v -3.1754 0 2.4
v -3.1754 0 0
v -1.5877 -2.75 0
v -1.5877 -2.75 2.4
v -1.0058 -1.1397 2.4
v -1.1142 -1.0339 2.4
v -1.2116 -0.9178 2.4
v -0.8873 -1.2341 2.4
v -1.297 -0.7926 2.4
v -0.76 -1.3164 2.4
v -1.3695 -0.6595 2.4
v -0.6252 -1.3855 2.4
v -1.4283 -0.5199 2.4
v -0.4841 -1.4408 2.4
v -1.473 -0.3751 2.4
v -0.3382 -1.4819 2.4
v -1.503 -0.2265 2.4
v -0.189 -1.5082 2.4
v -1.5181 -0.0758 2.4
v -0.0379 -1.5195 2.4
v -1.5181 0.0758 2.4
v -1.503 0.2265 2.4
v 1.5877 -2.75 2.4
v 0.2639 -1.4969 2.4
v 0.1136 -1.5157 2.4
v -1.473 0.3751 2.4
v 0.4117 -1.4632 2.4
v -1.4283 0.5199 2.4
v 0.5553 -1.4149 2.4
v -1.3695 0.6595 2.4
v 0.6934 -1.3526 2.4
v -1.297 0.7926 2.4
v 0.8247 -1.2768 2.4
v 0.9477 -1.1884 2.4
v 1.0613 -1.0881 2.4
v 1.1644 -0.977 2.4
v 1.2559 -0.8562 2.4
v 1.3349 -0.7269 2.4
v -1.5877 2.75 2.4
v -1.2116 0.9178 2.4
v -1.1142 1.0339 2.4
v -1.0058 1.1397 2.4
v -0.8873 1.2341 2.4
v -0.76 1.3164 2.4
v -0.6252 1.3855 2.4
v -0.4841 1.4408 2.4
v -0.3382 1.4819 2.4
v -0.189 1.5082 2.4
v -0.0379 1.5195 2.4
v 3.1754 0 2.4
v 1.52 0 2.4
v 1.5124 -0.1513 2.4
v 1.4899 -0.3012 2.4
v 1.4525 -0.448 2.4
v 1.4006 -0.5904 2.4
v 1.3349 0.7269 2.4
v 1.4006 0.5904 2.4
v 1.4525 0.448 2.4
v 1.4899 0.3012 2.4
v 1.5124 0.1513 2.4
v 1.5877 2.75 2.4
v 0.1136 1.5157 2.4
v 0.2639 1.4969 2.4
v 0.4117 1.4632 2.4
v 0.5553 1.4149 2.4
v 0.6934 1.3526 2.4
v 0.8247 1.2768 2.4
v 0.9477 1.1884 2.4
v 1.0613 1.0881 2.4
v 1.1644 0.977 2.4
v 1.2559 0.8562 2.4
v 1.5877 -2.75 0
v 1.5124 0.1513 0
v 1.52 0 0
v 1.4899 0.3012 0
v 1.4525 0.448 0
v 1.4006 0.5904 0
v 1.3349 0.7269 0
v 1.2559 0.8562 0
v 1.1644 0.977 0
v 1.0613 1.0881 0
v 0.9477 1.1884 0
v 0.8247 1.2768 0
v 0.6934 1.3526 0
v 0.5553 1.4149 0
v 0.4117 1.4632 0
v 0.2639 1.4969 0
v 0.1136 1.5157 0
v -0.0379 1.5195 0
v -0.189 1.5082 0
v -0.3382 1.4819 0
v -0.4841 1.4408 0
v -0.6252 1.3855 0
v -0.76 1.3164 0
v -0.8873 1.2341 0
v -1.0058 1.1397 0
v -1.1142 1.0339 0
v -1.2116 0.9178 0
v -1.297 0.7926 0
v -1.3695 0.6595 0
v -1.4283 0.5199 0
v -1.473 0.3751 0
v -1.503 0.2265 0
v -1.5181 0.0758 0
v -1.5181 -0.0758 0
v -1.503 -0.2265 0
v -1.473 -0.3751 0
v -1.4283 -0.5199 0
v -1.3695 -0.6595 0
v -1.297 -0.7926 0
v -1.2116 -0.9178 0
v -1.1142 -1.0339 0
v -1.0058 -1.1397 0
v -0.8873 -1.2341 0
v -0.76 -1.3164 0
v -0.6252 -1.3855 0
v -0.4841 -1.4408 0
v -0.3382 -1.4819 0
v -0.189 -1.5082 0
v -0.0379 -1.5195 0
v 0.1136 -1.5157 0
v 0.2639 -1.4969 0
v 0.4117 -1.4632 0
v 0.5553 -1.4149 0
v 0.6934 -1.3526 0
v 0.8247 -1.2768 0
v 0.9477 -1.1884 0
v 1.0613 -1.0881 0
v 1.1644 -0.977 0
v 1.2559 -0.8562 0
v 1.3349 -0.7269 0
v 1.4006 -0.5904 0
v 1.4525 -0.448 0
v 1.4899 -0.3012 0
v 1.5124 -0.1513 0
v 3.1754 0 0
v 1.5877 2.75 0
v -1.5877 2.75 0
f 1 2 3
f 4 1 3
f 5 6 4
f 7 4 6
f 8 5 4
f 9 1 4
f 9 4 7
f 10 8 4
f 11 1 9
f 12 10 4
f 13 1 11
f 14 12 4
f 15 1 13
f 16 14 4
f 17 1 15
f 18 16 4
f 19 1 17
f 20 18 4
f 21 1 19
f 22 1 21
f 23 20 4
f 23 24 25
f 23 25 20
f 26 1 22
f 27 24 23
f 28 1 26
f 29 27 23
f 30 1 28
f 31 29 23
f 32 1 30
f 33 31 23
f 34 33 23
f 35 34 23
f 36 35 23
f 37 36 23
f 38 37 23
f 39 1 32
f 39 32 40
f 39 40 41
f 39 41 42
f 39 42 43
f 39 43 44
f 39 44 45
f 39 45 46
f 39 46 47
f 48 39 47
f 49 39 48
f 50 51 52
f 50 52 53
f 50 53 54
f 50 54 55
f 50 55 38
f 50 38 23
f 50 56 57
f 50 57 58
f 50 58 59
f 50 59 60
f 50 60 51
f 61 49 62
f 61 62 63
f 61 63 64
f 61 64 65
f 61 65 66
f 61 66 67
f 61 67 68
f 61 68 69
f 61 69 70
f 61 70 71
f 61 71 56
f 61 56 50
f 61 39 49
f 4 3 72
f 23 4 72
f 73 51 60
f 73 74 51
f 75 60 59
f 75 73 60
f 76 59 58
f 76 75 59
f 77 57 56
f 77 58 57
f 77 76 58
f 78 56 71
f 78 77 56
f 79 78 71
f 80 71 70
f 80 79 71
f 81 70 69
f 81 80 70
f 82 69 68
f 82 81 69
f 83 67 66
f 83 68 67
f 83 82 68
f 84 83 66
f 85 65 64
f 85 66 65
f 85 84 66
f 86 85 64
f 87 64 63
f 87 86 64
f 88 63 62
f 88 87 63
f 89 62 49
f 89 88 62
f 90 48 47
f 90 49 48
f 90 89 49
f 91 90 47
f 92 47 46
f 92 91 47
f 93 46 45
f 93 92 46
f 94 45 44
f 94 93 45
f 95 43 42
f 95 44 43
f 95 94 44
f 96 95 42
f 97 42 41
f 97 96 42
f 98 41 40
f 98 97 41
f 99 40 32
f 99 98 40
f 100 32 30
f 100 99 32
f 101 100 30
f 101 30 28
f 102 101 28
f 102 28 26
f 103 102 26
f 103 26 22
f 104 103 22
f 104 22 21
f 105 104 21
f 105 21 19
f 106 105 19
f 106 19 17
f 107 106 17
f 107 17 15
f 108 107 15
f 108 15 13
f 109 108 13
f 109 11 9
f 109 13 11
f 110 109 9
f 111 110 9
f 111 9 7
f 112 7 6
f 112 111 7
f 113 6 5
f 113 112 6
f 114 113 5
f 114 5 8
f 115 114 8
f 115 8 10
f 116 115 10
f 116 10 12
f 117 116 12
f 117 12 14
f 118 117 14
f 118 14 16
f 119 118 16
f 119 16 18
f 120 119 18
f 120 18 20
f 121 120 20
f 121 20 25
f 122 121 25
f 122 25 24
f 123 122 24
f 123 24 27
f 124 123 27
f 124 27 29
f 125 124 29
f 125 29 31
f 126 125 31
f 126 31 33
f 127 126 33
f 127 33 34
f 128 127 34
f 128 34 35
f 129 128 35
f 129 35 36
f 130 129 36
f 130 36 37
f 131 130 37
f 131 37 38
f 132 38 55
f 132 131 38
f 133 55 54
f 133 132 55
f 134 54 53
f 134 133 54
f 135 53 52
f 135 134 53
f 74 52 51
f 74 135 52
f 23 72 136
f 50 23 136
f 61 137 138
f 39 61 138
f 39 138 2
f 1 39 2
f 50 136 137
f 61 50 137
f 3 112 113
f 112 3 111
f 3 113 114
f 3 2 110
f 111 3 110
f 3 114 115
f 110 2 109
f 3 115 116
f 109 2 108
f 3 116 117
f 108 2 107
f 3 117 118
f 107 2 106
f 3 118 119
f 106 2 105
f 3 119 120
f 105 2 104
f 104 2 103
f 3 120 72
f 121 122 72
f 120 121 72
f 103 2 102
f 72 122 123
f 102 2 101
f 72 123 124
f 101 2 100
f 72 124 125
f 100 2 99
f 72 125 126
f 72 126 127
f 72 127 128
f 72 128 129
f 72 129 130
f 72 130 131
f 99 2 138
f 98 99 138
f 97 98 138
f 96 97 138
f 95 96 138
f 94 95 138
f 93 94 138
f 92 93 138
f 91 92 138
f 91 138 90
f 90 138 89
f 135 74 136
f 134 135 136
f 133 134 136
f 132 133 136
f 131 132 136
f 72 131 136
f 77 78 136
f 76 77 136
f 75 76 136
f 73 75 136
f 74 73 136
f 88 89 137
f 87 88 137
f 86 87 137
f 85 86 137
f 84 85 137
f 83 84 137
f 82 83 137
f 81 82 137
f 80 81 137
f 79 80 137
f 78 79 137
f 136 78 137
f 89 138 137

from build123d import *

# Parameters (mm, degrees)
HEX_BLANK_DEPTH                  = 2.4
NOMINAL_THREAD_ENVELOPE_START    = -1
SKETCH_NOMINAL_THREAD_ENVELOPE_R = 1.52
NOMINAL_THREAD_ENVELOPE_DEPTH    = 4.4


with BuildPart() as part:
    # Sketch_Hex_blank → Hex_blank (new body)
    with BuildSketch(Plane.XY):
        Polygon((3.175426481, 0), (1.58771324, 2.75), (-1.58771324, 2.75), (-3.175426481, 0), (-1.58771324, -2.75), (1.58771324, -2.75), align=None)
    extrude(amount=HEX_BLANK_DEPTH)

    # Sketch_Nominal_thread_envelope → Nominal_thread_envelope (cut)
    with BuildSketch(Plane.XY.offset(NOMINAL_THREAD_ENVELOPE_START)):
        Circle(SKETCH_NOMINAL_THREAD_ENVELOPE_R)
    extrude(amount=NOMINAL_THREAD_ENVELOPE_DEPTH, mode=Mode.SUBTRACT)


solid = part.part
